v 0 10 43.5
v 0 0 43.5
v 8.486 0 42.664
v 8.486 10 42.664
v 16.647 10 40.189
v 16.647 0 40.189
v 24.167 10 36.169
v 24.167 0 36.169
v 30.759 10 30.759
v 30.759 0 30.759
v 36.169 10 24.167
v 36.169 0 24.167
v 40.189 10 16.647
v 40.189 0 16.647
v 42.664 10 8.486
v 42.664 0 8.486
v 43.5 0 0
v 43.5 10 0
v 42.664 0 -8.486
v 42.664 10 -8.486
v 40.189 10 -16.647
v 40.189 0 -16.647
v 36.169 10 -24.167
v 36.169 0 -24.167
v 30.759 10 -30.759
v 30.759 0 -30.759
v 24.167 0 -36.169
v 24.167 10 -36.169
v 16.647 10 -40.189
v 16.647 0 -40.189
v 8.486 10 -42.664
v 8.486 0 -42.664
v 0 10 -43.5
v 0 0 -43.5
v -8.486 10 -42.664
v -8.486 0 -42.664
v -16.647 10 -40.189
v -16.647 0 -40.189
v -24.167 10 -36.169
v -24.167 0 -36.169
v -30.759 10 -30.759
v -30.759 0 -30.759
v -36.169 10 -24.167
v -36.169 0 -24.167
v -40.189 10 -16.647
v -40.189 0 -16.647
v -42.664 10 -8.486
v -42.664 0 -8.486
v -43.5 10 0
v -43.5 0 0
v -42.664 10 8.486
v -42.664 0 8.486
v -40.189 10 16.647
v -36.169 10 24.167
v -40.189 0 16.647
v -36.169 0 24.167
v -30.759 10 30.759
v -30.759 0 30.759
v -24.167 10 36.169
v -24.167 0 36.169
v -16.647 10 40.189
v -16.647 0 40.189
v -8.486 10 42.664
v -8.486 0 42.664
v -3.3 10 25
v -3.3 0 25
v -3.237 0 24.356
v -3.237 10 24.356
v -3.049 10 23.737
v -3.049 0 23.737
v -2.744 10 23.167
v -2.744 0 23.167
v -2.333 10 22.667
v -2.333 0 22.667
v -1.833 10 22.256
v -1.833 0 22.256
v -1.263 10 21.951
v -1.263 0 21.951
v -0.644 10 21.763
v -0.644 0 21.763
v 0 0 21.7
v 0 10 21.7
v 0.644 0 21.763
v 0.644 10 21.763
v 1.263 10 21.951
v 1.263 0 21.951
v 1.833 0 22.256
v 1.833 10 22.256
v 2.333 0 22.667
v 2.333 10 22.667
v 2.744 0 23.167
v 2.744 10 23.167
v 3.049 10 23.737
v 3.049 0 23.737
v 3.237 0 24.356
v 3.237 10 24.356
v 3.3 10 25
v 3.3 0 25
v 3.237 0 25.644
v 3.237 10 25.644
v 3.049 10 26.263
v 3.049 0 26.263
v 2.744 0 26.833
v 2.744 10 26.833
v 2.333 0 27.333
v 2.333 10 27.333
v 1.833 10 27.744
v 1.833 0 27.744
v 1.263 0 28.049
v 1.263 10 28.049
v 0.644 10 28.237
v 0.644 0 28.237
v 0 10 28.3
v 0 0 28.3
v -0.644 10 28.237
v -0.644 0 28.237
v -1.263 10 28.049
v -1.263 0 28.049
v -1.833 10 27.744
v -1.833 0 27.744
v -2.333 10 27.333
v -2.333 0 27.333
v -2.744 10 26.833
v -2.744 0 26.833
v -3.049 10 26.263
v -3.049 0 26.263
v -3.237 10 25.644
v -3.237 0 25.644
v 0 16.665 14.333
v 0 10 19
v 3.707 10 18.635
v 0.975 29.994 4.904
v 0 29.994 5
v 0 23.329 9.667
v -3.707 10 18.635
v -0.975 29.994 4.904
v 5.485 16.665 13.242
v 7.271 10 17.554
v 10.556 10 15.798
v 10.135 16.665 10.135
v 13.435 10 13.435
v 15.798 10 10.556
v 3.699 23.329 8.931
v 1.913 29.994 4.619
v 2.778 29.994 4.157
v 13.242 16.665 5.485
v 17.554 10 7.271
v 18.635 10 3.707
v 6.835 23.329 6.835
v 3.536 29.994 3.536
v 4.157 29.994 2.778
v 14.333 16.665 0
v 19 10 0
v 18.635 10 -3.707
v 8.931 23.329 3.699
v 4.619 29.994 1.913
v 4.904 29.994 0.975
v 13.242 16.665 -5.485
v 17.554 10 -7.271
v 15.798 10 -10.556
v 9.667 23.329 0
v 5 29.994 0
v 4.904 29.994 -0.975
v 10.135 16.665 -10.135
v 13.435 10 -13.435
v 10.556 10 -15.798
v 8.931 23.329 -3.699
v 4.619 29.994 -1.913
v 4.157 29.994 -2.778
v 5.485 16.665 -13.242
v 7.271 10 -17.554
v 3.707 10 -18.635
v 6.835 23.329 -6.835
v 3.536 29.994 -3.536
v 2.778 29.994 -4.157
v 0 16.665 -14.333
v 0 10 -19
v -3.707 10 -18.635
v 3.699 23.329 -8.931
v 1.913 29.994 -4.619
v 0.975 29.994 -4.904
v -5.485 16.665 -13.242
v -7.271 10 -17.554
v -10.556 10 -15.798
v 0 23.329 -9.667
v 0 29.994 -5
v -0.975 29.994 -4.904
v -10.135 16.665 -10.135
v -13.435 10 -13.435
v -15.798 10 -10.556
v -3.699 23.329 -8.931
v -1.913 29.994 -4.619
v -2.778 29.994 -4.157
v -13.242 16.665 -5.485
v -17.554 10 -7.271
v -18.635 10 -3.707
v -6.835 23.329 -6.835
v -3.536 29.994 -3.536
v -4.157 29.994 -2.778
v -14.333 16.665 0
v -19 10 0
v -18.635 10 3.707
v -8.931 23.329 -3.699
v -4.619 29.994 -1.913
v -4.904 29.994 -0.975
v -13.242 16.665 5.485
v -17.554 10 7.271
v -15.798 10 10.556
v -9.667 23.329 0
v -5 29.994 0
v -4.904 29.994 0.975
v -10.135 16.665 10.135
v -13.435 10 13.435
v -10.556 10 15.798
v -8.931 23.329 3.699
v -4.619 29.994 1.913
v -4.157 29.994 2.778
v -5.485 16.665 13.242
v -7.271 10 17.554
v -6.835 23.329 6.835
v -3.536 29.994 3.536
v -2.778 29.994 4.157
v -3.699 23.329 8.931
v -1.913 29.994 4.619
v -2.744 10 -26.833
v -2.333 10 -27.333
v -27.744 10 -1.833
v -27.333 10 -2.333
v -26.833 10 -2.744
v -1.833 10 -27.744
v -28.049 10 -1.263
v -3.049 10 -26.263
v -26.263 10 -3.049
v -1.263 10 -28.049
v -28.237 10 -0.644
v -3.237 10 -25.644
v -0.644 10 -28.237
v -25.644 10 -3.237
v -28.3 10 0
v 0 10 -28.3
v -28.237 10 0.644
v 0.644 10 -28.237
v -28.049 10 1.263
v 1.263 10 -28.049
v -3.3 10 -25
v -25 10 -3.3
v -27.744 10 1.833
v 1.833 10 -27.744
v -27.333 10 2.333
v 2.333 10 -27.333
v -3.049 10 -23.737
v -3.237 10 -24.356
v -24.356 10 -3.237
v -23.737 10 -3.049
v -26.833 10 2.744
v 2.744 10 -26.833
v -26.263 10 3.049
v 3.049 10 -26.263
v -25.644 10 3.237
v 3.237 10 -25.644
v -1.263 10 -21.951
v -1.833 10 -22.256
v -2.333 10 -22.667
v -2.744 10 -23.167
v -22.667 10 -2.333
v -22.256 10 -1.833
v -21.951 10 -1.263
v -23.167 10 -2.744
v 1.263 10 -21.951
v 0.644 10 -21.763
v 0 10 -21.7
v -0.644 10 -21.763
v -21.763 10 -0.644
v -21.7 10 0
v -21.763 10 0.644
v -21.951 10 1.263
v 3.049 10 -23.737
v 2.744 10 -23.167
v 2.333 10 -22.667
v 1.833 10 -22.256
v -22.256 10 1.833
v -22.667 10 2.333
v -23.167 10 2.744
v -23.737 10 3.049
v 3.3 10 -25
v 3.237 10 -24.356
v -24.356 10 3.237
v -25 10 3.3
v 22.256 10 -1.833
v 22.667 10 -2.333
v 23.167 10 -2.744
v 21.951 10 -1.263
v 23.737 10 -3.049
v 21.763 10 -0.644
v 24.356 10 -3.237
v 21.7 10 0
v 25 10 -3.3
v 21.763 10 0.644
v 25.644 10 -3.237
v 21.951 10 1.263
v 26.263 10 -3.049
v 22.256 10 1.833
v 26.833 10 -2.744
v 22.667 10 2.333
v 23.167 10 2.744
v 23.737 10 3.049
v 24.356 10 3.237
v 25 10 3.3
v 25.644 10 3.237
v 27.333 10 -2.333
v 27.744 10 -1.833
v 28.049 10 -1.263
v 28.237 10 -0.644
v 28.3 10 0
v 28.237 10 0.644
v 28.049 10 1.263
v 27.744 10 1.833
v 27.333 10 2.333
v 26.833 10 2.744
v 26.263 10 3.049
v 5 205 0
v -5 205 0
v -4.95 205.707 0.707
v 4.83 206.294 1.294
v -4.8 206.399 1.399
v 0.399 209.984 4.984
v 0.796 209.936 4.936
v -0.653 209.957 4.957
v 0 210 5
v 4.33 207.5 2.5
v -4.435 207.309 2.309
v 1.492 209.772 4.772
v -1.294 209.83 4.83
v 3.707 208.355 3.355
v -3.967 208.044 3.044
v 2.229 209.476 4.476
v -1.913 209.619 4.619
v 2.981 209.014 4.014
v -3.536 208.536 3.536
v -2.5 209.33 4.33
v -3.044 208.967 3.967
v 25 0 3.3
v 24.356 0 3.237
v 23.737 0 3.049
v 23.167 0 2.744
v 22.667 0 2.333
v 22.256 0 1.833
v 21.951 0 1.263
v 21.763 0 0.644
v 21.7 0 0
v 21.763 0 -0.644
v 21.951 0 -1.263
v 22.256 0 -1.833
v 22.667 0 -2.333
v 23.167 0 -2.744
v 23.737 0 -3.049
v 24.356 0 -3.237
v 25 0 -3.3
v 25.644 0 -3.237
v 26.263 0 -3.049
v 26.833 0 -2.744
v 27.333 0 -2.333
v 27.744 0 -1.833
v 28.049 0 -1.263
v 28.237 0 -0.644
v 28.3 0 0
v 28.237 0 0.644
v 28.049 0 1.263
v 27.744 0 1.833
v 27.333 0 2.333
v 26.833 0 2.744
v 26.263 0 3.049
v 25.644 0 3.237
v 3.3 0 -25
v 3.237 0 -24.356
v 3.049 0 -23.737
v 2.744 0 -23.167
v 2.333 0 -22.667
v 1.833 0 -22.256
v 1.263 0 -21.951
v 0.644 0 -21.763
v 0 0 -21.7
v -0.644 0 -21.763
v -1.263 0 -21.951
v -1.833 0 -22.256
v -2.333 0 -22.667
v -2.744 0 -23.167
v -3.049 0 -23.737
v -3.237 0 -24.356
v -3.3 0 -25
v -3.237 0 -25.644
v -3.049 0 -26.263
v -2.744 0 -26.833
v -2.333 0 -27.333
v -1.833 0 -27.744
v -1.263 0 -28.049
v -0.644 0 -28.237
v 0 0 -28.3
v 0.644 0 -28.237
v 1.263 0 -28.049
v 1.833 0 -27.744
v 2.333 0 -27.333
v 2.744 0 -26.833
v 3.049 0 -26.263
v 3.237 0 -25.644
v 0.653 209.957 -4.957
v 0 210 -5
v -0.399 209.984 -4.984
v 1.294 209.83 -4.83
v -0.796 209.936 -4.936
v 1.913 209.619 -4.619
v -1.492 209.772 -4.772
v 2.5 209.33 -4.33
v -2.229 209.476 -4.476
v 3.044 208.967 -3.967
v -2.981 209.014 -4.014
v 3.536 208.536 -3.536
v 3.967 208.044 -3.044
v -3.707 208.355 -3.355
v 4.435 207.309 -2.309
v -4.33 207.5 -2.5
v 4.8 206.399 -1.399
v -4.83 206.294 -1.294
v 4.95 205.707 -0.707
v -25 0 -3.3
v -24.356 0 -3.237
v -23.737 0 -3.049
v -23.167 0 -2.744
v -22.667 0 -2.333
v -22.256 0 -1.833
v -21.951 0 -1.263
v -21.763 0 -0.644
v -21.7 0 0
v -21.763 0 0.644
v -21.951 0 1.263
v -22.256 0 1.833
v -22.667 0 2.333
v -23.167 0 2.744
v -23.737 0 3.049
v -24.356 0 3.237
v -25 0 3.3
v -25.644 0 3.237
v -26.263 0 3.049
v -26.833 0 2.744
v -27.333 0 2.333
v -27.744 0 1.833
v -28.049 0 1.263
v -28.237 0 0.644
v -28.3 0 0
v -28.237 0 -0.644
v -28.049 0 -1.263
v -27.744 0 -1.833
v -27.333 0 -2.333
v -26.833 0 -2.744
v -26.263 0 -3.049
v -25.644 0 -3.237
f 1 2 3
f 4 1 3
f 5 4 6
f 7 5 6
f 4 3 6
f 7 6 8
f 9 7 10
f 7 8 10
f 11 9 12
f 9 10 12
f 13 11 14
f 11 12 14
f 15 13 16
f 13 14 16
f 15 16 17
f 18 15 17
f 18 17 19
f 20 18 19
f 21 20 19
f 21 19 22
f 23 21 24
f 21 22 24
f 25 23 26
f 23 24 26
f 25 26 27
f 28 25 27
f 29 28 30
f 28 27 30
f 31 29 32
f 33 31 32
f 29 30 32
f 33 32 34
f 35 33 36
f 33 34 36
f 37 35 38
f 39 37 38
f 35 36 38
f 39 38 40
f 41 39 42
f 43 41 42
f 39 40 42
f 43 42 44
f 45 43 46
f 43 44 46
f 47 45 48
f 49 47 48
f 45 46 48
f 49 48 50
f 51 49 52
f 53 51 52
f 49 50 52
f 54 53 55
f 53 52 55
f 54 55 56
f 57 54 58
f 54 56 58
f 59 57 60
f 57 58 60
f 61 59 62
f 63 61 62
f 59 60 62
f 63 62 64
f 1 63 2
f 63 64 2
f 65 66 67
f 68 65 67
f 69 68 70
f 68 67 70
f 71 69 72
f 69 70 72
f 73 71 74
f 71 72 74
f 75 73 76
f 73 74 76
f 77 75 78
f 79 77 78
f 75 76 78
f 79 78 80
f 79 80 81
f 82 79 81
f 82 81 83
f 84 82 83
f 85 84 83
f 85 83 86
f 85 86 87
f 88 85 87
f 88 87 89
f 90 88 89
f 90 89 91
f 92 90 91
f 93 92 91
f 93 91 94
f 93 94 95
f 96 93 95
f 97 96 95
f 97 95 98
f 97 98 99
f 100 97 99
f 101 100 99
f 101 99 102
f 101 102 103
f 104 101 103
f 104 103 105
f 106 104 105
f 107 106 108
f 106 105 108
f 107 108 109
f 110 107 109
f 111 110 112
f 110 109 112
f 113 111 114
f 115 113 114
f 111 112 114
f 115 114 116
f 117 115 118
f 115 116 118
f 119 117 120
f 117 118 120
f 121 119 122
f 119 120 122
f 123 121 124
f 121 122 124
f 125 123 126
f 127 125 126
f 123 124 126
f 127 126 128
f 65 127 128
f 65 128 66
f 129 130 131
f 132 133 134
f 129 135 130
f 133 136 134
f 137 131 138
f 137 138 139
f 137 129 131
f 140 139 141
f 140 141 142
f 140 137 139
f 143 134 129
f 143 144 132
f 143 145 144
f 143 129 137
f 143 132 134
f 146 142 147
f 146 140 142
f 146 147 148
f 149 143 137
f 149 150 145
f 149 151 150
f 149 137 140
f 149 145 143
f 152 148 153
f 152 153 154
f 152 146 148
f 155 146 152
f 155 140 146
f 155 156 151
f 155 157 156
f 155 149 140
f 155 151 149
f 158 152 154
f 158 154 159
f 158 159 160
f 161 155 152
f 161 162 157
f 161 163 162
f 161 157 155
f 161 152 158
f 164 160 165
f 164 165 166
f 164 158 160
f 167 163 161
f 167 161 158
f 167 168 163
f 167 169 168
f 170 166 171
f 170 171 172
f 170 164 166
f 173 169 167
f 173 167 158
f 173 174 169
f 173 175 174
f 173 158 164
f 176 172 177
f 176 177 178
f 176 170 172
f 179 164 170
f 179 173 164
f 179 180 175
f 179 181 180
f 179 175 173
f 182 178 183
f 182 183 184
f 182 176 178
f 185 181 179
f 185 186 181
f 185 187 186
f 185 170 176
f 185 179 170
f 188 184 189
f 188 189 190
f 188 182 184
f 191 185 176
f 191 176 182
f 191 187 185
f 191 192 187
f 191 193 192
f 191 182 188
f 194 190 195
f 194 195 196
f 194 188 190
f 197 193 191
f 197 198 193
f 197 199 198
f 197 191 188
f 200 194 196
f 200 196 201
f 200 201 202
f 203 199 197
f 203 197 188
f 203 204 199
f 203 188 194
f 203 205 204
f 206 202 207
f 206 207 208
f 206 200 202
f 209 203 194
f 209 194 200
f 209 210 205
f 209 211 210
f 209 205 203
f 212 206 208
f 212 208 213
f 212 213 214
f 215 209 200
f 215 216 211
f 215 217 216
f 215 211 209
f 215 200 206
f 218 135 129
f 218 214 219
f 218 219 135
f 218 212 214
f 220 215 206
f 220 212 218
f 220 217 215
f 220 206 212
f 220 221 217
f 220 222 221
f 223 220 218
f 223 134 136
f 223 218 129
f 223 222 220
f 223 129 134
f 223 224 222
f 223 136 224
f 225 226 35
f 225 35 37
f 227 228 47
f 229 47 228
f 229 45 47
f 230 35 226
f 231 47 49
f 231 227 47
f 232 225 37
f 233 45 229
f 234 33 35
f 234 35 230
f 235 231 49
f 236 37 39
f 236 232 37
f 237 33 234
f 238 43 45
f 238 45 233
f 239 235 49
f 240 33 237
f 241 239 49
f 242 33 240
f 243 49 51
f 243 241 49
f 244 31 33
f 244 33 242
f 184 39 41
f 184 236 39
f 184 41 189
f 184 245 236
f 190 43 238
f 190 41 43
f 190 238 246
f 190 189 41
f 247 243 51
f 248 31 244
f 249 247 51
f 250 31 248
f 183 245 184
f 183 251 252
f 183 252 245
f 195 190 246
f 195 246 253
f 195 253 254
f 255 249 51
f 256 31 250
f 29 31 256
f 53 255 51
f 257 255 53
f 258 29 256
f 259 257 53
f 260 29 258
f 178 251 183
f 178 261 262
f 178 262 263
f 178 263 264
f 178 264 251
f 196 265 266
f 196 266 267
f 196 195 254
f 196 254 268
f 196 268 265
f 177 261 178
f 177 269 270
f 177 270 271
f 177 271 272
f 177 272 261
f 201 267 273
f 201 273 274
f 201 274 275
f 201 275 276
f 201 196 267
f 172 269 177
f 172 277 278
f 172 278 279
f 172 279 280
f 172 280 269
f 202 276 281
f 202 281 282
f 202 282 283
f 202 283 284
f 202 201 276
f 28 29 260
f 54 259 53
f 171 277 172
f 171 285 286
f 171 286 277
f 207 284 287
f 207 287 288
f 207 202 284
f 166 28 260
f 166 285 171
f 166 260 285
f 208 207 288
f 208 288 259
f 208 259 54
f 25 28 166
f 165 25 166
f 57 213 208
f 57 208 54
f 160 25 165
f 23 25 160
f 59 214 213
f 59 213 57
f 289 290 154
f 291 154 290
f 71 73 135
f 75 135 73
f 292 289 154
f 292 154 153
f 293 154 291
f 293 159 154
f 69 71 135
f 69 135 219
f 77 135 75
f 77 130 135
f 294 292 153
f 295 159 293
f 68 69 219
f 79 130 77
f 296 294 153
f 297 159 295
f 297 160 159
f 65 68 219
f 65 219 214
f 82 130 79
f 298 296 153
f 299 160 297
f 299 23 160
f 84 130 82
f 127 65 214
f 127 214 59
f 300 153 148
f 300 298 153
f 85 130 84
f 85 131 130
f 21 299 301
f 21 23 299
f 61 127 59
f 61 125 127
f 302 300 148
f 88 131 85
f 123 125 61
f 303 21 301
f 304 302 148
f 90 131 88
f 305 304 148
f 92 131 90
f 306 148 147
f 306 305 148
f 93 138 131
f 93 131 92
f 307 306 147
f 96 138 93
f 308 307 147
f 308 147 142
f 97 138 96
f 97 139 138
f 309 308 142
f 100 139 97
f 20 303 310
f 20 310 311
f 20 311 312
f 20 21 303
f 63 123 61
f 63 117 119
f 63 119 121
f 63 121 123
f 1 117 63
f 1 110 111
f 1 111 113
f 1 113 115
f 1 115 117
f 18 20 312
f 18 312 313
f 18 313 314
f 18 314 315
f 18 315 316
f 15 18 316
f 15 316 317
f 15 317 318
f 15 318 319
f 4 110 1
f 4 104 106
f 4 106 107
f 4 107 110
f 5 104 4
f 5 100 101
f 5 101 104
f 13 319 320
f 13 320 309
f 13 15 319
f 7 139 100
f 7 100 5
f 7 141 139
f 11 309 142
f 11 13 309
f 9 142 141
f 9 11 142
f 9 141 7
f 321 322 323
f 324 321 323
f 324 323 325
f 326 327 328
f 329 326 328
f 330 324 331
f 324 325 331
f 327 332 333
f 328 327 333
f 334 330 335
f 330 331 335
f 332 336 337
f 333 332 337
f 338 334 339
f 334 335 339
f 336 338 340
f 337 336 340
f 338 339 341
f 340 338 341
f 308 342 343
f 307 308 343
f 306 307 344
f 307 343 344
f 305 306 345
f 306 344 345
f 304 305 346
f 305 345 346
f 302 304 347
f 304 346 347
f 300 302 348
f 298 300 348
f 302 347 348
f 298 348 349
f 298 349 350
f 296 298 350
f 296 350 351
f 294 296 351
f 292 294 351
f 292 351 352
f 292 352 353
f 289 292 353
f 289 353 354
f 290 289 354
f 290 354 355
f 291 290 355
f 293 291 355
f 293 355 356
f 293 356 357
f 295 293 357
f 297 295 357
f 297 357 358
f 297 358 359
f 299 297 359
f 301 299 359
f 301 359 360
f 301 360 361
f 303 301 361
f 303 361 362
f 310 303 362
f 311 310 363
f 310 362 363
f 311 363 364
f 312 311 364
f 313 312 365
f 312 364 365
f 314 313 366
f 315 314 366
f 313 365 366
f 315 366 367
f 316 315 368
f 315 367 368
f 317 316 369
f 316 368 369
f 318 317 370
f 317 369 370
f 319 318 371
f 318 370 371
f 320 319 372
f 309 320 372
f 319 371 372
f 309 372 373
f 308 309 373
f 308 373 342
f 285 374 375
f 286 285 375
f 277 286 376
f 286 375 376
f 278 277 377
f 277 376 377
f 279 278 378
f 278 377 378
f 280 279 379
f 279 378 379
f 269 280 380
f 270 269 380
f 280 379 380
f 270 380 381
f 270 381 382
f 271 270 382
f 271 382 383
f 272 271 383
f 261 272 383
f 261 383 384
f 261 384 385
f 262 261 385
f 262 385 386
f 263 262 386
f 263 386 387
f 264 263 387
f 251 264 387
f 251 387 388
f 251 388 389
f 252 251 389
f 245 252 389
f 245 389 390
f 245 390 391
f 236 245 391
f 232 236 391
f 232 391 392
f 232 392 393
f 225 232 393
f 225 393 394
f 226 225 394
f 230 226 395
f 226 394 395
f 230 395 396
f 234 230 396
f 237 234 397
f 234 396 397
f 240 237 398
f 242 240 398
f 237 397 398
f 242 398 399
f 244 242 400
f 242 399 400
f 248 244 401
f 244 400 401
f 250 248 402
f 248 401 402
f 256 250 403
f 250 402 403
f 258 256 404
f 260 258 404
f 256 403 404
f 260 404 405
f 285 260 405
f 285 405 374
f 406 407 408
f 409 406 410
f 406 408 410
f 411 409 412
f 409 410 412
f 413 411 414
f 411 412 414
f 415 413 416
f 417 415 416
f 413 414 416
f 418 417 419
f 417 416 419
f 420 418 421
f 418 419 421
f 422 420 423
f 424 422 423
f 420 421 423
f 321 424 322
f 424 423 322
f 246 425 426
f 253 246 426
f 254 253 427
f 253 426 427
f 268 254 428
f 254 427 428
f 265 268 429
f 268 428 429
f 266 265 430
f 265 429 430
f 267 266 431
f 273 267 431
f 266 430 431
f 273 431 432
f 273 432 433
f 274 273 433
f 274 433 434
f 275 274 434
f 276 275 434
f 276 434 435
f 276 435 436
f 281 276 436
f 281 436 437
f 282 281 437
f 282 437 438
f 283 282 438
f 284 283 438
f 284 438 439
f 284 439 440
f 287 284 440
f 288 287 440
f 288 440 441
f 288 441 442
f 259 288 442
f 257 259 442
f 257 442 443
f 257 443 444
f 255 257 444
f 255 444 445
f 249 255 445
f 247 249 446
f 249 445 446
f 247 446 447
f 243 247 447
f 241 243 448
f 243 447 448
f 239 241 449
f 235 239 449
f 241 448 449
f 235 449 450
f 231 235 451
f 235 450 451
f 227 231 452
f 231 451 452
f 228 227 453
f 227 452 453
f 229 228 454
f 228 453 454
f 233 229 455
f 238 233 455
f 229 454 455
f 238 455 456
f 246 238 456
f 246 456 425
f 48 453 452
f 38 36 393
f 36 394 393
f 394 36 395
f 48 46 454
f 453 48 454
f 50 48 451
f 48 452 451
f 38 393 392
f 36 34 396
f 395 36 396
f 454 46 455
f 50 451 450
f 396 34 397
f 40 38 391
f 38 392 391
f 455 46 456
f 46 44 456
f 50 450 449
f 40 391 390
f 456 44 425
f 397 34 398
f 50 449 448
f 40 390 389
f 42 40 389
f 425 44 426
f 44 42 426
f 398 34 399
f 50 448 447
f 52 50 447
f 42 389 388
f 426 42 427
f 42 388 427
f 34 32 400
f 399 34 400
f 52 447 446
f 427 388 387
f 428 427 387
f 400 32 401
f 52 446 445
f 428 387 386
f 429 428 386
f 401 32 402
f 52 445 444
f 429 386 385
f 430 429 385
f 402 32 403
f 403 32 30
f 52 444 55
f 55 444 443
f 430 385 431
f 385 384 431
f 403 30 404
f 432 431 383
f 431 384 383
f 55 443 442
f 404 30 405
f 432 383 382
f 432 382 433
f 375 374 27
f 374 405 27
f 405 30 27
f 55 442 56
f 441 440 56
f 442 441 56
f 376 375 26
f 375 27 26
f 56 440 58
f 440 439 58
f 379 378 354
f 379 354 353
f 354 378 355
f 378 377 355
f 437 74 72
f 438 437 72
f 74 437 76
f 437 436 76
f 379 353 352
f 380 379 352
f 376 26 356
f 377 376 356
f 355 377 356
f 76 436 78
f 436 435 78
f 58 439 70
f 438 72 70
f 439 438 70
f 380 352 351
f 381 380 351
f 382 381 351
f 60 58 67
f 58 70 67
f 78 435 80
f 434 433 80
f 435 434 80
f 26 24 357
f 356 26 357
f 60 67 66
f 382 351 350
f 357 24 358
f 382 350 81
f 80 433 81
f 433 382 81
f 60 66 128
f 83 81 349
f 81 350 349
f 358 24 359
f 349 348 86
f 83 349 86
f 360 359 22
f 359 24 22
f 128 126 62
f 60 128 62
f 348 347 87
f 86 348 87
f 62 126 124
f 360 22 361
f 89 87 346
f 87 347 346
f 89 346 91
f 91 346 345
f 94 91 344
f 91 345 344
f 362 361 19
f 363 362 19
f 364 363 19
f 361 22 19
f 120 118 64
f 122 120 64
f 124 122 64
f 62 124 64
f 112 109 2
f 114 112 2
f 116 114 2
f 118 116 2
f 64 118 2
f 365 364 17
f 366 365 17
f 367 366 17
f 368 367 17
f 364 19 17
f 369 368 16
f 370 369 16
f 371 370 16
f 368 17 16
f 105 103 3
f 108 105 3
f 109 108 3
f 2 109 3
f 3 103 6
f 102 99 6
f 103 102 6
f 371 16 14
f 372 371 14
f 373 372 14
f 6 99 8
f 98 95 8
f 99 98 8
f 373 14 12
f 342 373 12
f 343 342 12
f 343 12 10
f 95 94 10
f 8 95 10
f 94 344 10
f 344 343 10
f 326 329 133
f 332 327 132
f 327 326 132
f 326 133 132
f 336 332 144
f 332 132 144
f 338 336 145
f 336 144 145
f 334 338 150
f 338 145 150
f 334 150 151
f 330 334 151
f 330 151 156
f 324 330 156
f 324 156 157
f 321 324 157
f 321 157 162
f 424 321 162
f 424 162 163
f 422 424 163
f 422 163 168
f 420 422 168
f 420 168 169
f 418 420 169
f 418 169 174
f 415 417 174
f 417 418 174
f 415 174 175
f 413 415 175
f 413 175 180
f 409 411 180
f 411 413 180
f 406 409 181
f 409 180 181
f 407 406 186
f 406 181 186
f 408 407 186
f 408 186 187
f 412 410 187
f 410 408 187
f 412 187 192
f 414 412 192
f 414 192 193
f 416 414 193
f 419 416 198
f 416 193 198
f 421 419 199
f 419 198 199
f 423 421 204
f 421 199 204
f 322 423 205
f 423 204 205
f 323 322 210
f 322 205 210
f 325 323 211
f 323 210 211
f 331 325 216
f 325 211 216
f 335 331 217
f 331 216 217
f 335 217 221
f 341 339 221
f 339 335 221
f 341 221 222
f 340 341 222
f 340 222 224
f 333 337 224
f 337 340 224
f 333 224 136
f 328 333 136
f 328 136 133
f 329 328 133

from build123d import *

# Parameters (mm, degrees)
SKETCH1_R                = 43.5
BOSS_EXTRUDE4_DEPTH      = 10
HOLE_WIZARD_M6_2_D       = 6.6
CIRPATTERN1_COUNT        = 4
SKETCH20_R               = 5
BOSS_EXTRUDE6_DEPTH      = 200
CUT_EXTRUDE_1_DEPTH      = 10
CUT_EXTRUDE_1_DEPTH_BACK = 10
CHAMFER_1_SIZE           = 14
CHAMFER_1_SIZE2          = 19.994072094


with BuildPart() as part:
    # Sketch1 → Boss-Extrude4 (new body)
    with BuildSketch(Plane(origin=(0, 0, 0), x_dir=(1, 0, 0), z_dir=(0, 1, 0))):
        Circle(SKETCH1_R)
    extrude(amount=BOSS_EXTRUDE4_DEPTH)

    # M6 여유 구멍2 (through all)
    with Locations(Plane(origin=(0, 10, 0), x_dir=(1, 0, 0), z_dir=(0, 1, 0))):
        with Locations((0, -25)):
            hole_wizard_m6_2 = Hole(HOLE_WIZARD_M6_2_D / 2)

    # CirPattern1: M6 여유 구멍2 ×4 about axis
    cirpattern1_axis = Axis((0, 10, 0), (0, -1, 0))
    for i in range(1, CIRPATTERN1_COUNT):
        add(hole_wizard_m6_2.rotate(cirpattern1_axis, i * 360 / CIRPATTERN1_COUNT), mode=Mode.SUBTRACT)

    # Sketch20 → Boss-Extrude6 (add)
    with BuildSketch(Plane(origin=(0, 10, 0), x_dir=(1, 0, 0), z_dir=(0, 1, 0))):
        Circle(SKETCH20_R)
    extrude(amount=BOSS_EXTRUDE6_DEPTH)

    # 스케치12 → 컷-돌출1 (cut, two sides: drawn at the far end of the back side and taken through both)
    with BuildSketch(Plane(origin=(0, 0, 0), x_dir=(0, 0, -1), z_dir=(1, 0, 0)).offset(-CUT_EXTRUDE_1_DEPTH_BACK)):
        Polygon((-5, 210), (5, 210), (0, 205), align=None)
    extrude(amount=CUT_EXTRUDE_1_DEPTH + CUT_EXTRUDE_1_DEPTH_BACK, mode=Mode.SUBTRACT)

    # 모따기1
    chamfer_1_edges = [part.edges().sort_by_distance(p)[0] for p in [
        (-5, 10, 0),
    ]]
    chamfer_1_side = [part.faces().sort_by_distance(p)[0] for p in [
        (-42.269634201, 10, 0),
    ]]
    chamfer(chamfer_1_edges, length=CHAMFER_1_SIZE, length2=CHAMFER_1_SIZE2, reference=chamfer_1_side[0])


solid = part.part
